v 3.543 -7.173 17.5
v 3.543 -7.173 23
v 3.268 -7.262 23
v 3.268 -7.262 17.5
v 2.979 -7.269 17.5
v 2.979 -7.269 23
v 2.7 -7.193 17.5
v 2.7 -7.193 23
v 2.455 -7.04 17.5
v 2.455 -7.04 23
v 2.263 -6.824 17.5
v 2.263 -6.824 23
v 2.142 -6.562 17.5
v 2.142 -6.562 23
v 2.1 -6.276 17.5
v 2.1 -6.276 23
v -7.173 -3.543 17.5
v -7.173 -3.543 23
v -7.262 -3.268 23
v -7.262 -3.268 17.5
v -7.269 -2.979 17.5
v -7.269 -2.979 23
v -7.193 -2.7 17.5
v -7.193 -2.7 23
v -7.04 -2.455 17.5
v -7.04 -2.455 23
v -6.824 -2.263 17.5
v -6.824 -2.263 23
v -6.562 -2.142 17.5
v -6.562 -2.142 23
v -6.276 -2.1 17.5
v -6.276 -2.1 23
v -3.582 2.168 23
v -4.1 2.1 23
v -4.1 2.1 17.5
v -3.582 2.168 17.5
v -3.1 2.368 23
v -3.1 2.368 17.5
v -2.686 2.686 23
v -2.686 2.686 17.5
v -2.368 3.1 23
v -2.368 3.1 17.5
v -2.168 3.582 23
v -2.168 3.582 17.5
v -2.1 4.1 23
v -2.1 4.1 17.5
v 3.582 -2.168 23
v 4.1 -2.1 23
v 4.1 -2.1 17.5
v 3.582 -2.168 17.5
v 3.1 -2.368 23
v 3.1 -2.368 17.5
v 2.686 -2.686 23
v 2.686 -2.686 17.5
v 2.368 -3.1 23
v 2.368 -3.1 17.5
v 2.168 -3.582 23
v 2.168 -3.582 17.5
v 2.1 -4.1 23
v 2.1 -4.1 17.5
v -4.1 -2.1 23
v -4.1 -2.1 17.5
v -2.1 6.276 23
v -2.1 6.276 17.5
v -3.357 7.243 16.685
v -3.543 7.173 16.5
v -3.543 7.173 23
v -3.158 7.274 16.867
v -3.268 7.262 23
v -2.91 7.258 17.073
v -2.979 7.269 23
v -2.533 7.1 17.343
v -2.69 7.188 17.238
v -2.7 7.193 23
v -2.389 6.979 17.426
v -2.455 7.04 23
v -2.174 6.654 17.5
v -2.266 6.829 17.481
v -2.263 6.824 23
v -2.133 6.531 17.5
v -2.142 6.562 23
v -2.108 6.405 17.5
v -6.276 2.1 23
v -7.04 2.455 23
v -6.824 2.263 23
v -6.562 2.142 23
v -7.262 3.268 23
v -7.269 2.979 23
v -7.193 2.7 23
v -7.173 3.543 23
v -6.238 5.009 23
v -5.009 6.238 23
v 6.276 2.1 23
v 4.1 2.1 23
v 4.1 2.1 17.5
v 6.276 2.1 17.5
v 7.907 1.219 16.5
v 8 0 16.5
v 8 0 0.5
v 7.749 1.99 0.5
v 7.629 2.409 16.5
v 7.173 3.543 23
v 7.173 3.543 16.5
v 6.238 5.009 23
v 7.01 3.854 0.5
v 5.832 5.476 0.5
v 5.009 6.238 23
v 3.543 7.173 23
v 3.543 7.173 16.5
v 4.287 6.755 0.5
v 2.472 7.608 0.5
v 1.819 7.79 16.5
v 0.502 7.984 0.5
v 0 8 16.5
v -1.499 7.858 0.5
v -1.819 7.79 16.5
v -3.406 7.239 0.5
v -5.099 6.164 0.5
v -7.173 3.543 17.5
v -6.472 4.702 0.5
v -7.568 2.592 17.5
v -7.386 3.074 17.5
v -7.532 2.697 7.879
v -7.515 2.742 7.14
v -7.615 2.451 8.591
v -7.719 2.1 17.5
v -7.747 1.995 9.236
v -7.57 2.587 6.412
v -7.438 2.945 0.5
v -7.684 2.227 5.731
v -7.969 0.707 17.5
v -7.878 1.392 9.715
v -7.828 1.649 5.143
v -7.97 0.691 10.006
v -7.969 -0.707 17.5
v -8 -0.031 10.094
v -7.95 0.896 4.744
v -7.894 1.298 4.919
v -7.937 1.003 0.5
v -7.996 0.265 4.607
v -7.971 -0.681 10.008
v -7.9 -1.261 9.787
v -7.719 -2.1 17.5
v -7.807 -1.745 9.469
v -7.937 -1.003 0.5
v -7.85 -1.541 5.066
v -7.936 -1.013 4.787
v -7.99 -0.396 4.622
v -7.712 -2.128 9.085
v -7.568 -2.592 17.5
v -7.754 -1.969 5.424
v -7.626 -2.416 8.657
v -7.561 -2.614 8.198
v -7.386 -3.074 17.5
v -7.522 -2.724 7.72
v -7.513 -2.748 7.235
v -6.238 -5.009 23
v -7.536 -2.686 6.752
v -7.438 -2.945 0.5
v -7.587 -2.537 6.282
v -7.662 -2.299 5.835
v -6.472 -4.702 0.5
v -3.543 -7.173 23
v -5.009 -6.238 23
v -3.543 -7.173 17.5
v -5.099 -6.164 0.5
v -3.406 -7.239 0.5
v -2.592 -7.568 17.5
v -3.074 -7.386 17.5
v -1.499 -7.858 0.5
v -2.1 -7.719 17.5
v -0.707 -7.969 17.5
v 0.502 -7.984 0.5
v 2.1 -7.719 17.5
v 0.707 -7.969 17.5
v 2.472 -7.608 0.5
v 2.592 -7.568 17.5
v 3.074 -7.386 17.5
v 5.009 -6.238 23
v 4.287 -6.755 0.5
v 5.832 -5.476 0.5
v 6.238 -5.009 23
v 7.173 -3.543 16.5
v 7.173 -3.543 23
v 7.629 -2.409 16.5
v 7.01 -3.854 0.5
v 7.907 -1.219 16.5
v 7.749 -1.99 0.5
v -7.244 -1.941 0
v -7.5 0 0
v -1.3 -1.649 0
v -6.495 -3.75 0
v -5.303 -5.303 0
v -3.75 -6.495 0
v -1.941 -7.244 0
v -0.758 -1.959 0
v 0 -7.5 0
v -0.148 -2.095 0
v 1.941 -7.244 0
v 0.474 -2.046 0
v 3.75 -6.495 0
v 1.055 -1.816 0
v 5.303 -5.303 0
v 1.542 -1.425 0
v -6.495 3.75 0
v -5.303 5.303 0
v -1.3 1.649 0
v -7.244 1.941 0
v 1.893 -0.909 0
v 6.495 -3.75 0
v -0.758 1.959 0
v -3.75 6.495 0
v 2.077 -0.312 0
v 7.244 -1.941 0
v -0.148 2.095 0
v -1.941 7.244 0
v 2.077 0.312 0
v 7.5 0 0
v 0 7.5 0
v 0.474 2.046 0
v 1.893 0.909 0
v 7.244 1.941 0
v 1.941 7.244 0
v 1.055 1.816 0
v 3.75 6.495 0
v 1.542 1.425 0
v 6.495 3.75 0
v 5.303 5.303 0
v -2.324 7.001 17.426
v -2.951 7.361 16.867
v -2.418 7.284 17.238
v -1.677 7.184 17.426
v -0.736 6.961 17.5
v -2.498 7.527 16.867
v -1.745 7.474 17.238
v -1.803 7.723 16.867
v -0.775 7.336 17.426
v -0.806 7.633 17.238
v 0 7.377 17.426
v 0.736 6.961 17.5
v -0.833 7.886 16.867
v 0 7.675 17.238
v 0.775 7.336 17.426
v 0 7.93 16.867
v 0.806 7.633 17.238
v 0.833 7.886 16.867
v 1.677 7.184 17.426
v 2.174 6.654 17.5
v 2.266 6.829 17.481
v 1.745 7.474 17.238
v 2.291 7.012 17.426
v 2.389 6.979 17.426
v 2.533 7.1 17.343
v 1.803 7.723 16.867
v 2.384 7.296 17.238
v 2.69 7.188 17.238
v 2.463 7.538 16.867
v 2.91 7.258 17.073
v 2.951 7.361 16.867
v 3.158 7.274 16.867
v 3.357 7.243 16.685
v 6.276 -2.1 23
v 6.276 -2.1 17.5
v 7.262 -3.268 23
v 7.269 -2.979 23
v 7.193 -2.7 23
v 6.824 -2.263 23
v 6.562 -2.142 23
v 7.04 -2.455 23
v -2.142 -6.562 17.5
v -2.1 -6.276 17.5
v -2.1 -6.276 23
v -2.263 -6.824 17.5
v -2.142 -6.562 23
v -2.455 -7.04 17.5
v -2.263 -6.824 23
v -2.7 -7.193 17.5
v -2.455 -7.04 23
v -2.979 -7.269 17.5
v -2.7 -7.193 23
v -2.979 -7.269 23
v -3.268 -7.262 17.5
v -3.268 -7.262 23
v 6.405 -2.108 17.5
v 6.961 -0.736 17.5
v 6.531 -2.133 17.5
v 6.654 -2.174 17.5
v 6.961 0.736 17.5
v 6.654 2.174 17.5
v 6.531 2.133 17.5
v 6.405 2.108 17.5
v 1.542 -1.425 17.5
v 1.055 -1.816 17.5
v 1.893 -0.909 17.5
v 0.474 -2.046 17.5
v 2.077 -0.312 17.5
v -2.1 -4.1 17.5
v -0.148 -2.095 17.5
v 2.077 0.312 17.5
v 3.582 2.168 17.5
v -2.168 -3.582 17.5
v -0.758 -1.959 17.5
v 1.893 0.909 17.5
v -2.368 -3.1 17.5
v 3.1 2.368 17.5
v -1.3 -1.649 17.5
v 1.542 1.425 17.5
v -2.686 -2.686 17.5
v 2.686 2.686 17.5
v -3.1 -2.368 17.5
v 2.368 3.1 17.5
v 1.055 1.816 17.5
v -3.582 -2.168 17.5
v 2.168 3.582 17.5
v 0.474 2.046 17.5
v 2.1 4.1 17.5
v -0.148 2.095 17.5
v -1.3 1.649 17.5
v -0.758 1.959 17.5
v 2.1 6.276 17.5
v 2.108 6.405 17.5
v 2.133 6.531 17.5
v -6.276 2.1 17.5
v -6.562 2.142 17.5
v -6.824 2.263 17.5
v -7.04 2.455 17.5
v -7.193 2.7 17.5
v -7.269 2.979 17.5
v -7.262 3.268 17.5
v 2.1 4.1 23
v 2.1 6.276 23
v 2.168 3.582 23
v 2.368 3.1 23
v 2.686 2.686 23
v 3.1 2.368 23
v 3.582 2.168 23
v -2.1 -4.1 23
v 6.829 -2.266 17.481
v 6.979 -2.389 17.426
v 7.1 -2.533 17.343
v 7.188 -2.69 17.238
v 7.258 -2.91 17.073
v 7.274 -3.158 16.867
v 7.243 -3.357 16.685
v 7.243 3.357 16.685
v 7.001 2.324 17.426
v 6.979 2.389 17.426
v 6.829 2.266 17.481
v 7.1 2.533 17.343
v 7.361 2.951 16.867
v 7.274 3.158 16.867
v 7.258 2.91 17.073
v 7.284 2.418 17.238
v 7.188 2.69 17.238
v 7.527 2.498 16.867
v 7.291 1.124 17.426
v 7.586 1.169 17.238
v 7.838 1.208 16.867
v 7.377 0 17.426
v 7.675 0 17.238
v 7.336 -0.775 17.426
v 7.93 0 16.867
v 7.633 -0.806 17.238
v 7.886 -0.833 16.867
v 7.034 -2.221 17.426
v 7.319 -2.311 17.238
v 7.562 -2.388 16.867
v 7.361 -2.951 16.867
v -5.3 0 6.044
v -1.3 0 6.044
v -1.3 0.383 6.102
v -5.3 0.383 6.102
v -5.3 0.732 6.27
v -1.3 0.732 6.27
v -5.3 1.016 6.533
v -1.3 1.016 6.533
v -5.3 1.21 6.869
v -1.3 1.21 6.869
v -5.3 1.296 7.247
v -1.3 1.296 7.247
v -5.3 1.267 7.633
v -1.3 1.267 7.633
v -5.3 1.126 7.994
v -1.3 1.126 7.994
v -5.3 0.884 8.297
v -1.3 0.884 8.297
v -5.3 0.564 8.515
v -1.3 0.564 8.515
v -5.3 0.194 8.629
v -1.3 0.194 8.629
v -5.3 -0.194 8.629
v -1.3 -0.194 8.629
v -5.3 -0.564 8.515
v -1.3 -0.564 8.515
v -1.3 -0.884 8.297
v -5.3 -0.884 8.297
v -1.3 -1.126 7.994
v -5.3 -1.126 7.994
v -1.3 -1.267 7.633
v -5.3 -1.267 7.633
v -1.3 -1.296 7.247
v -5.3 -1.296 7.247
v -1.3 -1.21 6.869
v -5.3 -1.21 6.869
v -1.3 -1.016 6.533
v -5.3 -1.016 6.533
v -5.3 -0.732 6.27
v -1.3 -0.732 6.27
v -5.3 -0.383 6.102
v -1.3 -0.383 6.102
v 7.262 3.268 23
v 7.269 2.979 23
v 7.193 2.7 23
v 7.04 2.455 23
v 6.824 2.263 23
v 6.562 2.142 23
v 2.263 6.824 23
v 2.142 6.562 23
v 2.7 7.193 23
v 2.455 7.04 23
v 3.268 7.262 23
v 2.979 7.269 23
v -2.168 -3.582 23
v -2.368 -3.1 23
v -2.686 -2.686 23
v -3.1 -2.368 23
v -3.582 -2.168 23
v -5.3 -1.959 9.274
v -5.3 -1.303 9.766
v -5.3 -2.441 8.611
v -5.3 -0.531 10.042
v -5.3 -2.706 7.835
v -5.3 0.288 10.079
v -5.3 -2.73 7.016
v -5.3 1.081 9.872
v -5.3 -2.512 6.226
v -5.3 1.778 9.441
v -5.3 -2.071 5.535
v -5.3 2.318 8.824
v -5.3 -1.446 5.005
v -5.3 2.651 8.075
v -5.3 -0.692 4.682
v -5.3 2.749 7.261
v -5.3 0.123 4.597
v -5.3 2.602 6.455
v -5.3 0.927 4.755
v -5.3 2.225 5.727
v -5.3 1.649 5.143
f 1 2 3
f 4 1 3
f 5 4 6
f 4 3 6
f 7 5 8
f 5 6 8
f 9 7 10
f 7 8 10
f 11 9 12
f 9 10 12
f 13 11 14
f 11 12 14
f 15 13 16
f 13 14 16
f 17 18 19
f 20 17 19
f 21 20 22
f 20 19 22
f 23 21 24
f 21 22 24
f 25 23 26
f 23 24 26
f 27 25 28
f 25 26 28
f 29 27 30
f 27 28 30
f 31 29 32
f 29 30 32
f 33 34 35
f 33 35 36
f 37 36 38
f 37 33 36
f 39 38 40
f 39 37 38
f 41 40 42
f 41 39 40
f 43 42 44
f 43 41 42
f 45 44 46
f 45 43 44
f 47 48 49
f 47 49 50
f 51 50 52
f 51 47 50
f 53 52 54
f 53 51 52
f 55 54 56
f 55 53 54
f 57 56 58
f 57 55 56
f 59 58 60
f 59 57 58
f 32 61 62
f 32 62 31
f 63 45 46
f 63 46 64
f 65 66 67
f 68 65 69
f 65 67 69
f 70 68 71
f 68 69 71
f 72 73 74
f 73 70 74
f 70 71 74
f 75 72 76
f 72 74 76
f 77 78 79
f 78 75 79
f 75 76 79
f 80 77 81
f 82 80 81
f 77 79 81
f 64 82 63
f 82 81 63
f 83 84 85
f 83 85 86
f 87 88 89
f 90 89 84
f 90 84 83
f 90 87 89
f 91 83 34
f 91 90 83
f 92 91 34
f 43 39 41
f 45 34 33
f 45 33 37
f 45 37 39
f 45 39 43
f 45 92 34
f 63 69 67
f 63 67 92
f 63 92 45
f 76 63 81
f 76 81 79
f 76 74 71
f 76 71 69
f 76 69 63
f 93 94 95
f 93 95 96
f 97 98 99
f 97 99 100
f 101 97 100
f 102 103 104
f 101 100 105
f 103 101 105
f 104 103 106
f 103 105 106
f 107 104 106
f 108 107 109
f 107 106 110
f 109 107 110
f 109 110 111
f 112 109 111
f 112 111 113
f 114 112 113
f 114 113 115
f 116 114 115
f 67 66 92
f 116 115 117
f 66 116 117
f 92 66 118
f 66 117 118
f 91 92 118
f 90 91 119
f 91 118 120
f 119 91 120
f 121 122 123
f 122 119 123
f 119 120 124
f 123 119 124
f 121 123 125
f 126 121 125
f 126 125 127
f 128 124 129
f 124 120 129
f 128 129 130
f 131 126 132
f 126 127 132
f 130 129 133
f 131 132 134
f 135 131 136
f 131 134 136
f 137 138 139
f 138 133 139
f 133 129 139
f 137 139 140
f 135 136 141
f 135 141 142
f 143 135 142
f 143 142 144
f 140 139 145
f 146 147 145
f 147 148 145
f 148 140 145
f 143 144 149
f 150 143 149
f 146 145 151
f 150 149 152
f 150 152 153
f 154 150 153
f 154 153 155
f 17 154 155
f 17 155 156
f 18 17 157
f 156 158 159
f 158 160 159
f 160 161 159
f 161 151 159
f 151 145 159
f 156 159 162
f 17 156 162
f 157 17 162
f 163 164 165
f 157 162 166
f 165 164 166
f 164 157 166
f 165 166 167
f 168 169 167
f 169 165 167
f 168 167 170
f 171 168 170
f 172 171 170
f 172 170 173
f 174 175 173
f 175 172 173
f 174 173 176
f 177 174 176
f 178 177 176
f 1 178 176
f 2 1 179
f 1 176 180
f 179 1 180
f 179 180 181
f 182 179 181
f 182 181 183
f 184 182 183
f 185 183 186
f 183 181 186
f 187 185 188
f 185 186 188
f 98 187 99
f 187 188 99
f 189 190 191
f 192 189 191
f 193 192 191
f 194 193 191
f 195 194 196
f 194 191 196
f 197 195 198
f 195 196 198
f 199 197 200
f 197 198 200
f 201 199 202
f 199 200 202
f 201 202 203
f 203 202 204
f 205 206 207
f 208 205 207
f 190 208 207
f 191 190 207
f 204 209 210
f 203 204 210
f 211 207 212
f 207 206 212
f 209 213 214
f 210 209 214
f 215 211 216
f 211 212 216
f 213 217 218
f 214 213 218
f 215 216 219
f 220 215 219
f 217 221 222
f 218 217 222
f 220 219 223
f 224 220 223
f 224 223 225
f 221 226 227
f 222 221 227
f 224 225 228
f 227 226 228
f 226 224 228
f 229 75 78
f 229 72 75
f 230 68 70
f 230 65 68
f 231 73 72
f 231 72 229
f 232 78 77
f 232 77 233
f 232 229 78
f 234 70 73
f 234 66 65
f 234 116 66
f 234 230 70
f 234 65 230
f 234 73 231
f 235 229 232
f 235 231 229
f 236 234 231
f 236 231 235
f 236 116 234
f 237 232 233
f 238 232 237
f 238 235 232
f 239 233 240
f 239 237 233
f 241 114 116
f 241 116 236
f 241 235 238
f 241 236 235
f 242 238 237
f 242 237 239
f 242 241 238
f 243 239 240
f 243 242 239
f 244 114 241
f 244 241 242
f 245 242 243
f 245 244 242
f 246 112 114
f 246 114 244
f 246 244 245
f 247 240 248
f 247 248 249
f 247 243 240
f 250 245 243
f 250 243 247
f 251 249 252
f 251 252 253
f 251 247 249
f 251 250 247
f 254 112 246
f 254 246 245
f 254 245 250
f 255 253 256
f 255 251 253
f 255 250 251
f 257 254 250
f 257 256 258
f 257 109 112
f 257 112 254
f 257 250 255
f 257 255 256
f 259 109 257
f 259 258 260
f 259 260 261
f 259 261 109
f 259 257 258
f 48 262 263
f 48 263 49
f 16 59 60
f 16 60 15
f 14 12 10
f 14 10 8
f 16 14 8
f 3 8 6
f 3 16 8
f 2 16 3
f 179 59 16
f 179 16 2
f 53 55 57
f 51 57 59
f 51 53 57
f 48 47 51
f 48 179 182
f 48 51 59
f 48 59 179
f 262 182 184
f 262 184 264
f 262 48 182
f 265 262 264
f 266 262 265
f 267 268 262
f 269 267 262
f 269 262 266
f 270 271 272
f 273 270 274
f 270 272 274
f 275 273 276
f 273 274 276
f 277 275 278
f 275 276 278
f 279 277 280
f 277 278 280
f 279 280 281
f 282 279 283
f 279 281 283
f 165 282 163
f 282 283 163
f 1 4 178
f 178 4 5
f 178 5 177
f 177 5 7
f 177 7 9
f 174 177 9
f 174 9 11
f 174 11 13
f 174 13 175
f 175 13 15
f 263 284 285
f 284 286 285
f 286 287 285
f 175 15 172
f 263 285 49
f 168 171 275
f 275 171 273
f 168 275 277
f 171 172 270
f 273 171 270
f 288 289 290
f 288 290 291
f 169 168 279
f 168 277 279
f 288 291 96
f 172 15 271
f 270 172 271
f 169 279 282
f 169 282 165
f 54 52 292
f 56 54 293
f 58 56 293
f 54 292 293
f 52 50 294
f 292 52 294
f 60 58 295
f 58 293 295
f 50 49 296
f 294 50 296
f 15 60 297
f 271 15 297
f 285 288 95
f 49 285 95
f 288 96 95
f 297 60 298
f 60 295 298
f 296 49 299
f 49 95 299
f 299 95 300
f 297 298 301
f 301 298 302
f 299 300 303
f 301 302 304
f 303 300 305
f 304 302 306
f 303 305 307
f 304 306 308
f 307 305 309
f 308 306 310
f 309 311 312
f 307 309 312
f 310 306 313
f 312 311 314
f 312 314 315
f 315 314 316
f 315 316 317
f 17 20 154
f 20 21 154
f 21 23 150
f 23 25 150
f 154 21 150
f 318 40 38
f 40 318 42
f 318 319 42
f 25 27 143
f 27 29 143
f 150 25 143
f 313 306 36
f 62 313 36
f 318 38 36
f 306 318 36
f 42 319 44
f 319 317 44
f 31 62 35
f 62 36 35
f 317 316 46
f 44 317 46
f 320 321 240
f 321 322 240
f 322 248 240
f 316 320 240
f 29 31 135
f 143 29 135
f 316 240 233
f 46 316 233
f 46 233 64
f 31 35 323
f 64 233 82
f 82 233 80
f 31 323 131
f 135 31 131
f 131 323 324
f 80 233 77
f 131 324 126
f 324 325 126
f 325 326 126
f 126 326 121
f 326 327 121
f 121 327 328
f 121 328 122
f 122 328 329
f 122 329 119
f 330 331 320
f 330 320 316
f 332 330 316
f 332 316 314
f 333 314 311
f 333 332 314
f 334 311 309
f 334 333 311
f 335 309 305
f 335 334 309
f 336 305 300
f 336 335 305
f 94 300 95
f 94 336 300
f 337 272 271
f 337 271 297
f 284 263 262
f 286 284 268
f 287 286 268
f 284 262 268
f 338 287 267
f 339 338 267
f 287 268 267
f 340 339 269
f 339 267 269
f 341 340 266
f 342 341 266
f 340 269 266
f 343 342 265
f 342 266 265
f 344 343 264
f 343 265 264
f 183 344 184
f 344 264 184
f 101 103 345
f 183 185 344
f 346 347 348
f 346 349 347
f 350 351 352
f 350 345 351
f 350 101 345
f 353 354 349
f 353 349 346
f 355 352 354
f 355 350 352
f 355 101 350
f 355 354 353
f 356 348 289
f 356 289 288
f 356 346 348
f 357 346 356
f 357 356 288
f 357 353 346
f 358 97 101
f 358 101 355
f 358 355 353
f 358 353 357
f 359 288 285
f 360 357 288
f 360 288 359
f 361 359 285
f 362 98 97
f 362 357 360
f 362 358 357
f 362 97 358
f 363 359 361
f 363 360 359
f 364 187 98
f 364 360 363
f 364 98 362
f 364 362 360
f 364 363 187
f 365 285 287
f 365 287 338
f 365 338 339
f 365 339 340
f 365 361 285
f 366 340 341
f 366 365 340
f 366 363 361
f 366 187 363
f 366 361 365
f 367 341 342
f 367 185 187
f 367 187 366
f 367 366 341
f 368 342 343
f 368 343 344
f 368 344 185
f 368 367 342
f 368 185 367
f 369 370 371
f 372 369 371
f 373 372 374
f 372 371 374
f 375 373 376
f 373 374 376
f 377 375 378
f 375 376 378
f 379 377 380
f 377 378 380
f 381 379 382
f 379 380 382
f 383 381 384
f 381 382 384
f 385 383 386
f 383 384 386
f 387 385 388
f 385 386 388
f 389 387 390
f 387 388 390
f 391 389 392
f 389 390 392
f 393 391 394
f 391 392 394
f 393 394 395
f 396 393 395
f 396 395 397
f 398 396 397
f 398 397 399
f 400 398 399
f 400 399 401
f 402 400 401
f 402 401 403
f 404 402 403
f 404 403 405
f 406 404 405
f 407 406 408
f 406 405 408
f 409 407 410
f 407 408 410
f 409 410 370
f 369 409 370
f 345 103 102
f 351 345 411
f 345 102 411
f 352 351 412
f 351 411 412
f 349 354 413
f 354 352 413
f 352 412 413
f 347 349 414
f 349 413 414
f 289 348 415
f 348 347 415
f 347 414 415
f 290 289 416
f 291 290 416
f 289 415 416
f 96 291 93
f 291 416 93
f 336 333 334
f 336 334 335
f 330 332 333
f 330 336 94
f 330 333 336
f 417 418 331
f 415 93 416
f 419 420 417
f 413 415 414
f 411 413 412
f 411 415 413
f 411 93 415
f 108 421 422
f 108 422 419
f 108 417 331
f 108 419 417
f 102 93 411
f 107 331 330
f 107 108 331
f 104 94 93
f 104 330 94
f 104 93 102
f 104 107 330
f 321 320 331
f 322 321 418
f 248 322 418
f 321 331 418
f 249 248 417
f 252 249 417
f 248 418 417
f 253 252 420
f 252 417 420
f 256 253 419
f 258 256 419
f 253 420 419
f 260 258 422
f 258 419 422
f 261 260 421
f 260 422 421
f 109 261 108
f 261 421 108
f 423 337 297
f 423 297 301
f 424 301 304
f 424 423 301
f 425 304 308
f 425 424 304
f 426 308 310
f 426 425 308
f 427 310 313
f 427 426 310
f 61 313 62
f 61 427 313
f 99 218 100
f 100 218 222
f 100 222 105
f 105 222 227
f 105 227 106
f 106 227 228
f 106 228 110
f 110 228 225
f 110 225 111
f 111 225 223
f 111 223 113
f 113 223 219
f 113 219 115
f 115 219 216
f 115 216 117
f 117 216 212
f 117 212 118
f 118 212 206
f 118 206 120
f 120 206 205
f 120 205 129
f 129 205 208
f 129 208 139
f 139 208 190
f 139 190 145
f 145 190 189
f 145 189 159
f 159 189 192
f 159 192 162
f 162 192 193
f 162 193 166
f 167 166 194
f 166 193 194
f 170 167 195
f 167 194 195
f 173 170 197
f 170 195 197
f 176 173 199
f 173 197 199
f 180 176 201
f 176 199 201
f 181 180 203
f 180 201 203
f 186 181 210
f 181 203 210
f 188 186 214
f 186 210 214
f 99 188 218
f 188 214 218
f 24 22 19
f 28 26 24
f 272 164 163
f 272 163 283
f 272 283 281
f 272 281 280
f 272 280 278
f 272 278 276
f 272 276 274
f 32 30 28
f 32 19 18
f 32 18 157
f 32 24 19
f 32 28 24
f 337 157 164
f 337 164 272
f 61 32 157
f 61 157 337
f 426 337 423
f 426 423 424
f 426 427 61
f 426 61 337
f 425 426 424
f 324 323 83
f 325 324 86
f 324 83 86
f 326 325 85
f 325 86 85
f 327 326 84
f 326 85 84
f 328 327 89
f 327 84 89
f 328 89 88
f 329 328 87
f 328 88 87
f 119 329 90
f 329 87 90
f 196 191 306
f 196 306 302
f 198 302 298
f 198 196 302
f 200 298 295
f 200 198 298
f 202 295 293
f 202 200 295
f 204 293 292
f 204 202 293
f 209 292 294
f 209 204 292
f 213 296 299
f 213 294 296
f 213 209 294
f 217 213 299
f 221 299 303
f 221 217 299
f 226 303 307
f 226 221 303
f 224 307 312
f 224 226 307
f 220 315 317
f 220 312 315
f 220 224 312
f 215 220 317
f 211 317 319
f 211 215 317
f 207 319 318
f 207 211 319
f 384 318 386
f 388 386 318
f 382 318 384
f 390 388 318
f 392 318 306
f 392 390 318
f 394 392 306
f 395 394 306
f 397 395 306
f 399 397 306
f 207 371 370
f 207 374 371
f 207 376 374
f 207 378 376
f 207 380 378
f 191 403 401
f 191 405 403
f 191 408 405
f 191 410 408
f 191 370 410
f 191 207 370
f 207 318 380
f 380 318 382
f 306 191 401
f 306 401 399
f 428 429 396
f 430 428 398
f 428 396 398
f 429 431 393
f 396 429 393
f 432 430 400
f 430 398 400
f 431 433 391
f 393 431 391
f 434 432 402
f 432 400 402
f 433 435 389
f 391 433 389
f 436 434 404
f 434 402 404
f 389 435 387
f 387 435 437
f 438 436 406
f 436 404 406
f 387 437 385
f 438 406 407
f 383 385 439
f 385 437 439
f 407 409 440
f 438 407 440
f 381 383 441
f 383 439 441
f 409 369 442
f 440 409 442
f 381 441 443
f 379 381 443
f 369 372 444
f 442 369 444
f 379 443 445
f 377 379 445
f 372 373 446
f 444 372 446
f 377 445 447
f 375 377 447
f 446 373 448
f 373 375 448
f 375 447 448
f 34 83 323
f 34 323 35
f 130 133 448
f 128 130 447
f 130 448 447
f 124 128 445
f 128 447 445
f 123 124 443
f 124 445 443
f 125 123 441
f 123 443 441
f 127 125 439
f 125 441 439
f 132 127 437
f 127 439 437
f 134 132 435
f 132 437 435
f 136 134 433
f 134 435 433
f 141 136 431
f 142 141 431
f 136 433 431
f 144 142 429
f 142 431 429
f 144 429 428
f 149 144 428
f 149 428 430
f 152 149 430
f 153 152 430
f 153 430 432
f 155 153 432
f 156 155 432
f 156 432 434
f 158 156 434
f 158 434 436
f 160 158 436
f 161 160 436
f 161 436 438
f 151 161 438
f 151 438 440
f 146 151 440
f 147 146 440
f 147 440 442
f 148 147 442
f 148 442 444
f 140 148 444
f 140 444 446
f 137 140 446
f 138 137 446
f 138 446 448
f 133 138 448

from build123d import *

# Parameters (mm, degrees)
SKETCH1_R           = 8
BOSS_EXTRUDE1_DEPTH = 23
CUT_EXTRUDE1_DEPTH  = 5.5
CHAMFER1_SIZE       = 0.5
FILLET1_R           = 1
SKETCH3_R           = 2.75
CUT_EXTRUDE2_DEPTH  = 15.5
SKETCH5_R           = 3.239790556
SKETCH5_R_2         = 1.3
BOSS_EXTRUDE2_DEPTH = 4


with BuildPart() as part:
    # Sketch1 → Boss-Extrude1 (new body)
    with BuildSketch(Plane.XY):
        Circle(SKETCH1_R)
        with BuildLine():
            Line((-1.3, 1.64924225), (-1.3, -1.64924225))
            ThreePointArc((-1.3, -1.64924225), (2.1, 0), (-1.3, 1.64924225))
        make_face(mode=Mode.SUBTRACT)
    extrude(amount=BOSS_EXTRUDE1_DEPTH)

    # Sketch2 → Cut-Extrude1 (cut)
    with BuildSketch(Plane.XY.offset(23)):
        with BuildLine():
            Line((4.1, 2.1), (9.874781321, 2.1))
            Line((9.874781321, 2.1), (9.874781321, -2.1))
            Line((9.874781321, -2.1), (4.1, -2.1))
            ThreePointArc((4.1, -2.1), (2.685786438, -2.685786438), (2.1, -4.1))
            Line((2.1, -4.1), (2.1, -8.269913673))
            Line((2.1, -8.269913673), (-2.1, -8.269913673))
            Line((-2.1, -8.269913673), (-2.1, -4.1))
            ThreePointArc((-2.1, -4.1), (-2.685786438, -2.685786438), (-4.1, -2.1))
            Line((-4.1, -2.1), (-9.874781321, -2.1))
            Line((-9.874781321, -2.1), (-9.874781321, 2.1))
            Line((-9.874781321, 2.1), (-4.1, 2.1))
            ThreePointArc((-4.1, 2.1), (-2.685786438, 2.685786438), (-2.1, 4.1))
            Line((-2.1, 4.1), (-2.1, 8.269913673))
            Line((-2.1, 8.269913673), (2.1, 8.269913673))
            Line((2.1, 8.269913673), (2.1, 4.1))
            ThreePointArc((2.1, 4.1), (2.685786438, 2.685786438), (4.1, 2.1))
        make_face()
    extrude(amount=-CUT_EXTRUDE1_DEPTH, mode=Mode.SUBTRACT)

    # Chamfer1
    chamfer1_edges = [part.edges().sort_by_distance(p)[0] for p in [
        (-8, 0, 0),
    ]]
    chamfer(chamfer1_edges, length=CHAMFER1_SIZE)

    # Fillet1
    # the kernel refuses this fillet: 1 mm, written as the material it takes off along each edge
    with BuildSketch(Plane(origin=(-7.719455939, 2.1, 26.857409903), x_dir=(0.35433001139154063, 0.9351204430592194, 0), z_dir=(0, 0, -1)), Plane(origin=(-2.1, -7.719455939, 26.857409903), x_dir=(-0.9351204430592192, 0.354330011391541, 0), z_dir=(0, 0, -1)), Plane(origin=(7.719455939, -2.1, 26.857409903), x_dir=(-0.354330011391541, -0.9351204430592192, 0), z_dir=(0, 0, -1)), Plane(origin=(2.1, 7.719455939, 26.857409903), x_dir=(0.935120443059219, -0.3543300113915411, 0), z_dir=(0, 0, -1))) as fillet1_piece_1:
        with BuildLine():
            CenterArc((1.446528713, 0.99533926), FILLET1_R, 159.247612079, 116.286320683)
            Line((0.51140827, 1.349669272), (0, 0))
            ThreePointArc((0, 0), (0.771481981, -0.037285918), (1.542963961, 0))
        make_face()
    extrude(amount=9.357409903, mode=Mode.SUBTRACT)
    with BuildSketch(Plane(origin=(-7.719455939, -2.1, 26.857409903), x_dir=(0.35433001139154124, -0.9351204430592192, 0), z_dir=(0, 0, -1)), Plane(origin=(2.1, -7.719455939, 26.857409903), x_dir=(0.935120443059219, 0.3543300113915412, 0), z_dir=(0, 0, -1)), Plane(origin=(7.719455939, 2.1, 26.857409903), x_dir=(-0.3543300113915409, 0.9351204430592193, 0), z_dir=(0, 0, -1)), Plane(origin=(-2.1, 7.719455939, 26.857409903), x_dir=(-0.935120443059219, -0.3543300113915412, 0), z_dir=(0, 0, -1))) as fillet1_piece_2:
        with BuildLine():
            CenterArc((1.446528713, -0.99533926), FILLET1_R, 84.466067237, 116.286320683)
            Line((0.51140827, -1.349669272), (0, 0))
            ThreePointArc((0, 0), (0.771481981, 0.037285918), (1.542963961, 0))
        make_face()
    extrude(amount=9.357409903, mode=Mode.SUBTRACT)
    with BuildSketch(Plane(origin=(0, 0, 17.5), x_dir=(1, 0, 0), z_dir=(0, 1, 0))) as fillet1_piece_3_section:
        with BuildLine():
            CenterArc((8 - FILLET1_R, FILLET1_R), FILLET1_R, 270, 90)
            Line((8 - FILLET1_R, 0), (8, 0))
            Line((8, 0), (8, FILLET1_R))
        make_face()
    fillet1_piece_3 = revolve(axis=Axis((0, 0, 17.5), (0, 0, -1)), revolution_arc=33.123591855, mode=Mode.PRIVATE)
    fillet1_piece_3 = split(fillet1_piece_3, bisect_by=Plane(origin=(7.676771465, -2.1, 17.273698774), z_dir=(0, 1, 0)), keep=Keep.TOP, mode=Mode.PRIVATE)
    add(fillet1_piece_3, mode=Mode.SUBTRACT)
    with BuildSketch(Plane(origin=(0, 0, 17.5), x_dir=(-0.5464558660226709, 0.8374879022943631, 0), z_dir=(-0.8374879022943631, -0.5464558660226709, 0))) as fillet1_piece_4_section:
        with BuildLine():
            CenterArc((8 - FILLET1_R, FILLET1_R), FILLET1_R, 270, 90)
            Line((8 - FILLET1_R, 0), (8, 0))
            Line((8, 0), (8, FILLET1_R))
        make_face()
    fillet1_piece_4 = revolve(axis=Axis((0, 0, 17.5), (0, 0, -1)), revolution_arc=66.248417342, mode=Mode.PRIVATE)
    fillet1_piece_4 = split(fillet1_piece_4, bisect_by=Plane(origin=(2.1, 7.676771683, 17.273698772), z_dir=(-1, 0, 0)), keep=Keep.TOP, mode=Mode.PRIVATE)
    fillet1_piece_4 = split(fillet1_piece_4, bisect_by=Plane(origin=(-2.1, 7.676771683, 17.273698772), z_dir=(1, 0, 0)), keep=Keep.TOP, mode=Mode.PRIVATE)
    add(fillet1_piece_4, mode=Mode.SUBTRACT)
    with BuildSketch(Plane(origin=(0, 0, 17.5), x_dir=(0.8374937851055057, 0.5464468500317786, 0), z_dir=(-0.5464468500317786, 0.8374937851055057, 0))) as fillet1_piece_5_section:
        with BuildLine():
            CenterArc((8 - FILLET1_R, FILLET1_R), FILLET1_R, 270, 90)
            Line((8 - FILLET1_R, 0), (8, 0))
            Line((8, 0), (8, FILLET1_R))
        make_face()
    fillet1_piece_5 = revolve(axis=Axis((0, 0, 17.5), (0, 0, -1)), revolution_arc=33.123591855, mode=Mode.PRIVATE)
    fillet1_piece_5 = split(fillet1_piece_5, bisect_by=Plane(origin=(7.676771942, 2.1, 17.273698679), z_dir=(0, -1, 0)), keep=Keep.TOP, mode=Mode.PRIVATE)
    add(fillet1_piece_5, mode=Mode.SUBTRACT)
    with BuildSketch(Plane(origin=(0, 0, 17.5), x_dir=(1, 0, 0), z_dir=(0, 1, 0))) as fillet1_piece_6a_section:
        with BuildLine():
            CenterArc((8 - FILLET1_R, FILLET1_R), FILLET1_R, 270, 90)
            Line((8 - FILLET1_R, 0), (8, 0))
            Line((8, 0), (8, FILLET1_R))
        make_face()
    fillet1_piece_6a = revolve(axis=Axis((0, 0, 17.5), (0, 0, -1)), revolution_arc=33.123591855, mode=Mode.PRIVATE)
    fillet1_piece_6a = split(fillet1_piece_6a, bisect_by=Plane(origin=(7.062995789, -2.1, 17.266816247), z_dir=(0, -1, 0)), keep=Keep.TOP, mode=Mode.PRIVATE)
    with BuildSketch(Plane(origin=(7.719455939, -2.1, 26.857409903), x_dir=(-0.354330011391541, -0.9351204430592192, 0), z_dir=(0, 0, -1))) as fillet1_piece_6b_section:
        with BuildLine():
            CenterArc((1.446528713, 0.99533926), FILLET1_R, 159.247612079, 116.286320683)
            Line((0.51140827, 1.349669272), (0, 0))
            ThreePointArc((0, 0), (0.771481981, -0.037285918), (1.542963961, 0))
        make_face()
    fillet1_piece_6b = extrude(amount=13.214819805, mode=Mode.PRIVATE)
    fillet1_piece_6b = split(fillet1_piece_6b, bisect_by=Plane(origin=(7.268798231, -2.449324776, 17.5), z_dir=(0, 0, -1)), keep=Keep.TOP, mode=Mode.PRIVATE)
    fillet1_piece_6 = fillet1_piece_6a & fillet1_piece_6b
    add(fillet1_piece_6, mode=Mode.SUBTRACT)
    with BuildSketch(Plane(origin=(0, 0, 17.5), x_dir=(0.8374937851055057, 0.5464468500317786, 0), z_dir=(-0.5464468500317786, 0.8374937851055057, 0))) as fillet1_piece_7a_section:
        with BuildLine():
            CenterArc((8 - FILLET1_R, FILLET1_R), FILLET1_R, 270, 90)
            Line((8 - FILLET1_R, 0), (8, 0))
            Line((8, 0), (8, FILLET1_R))
        make_face()
    fillet1_piece_7a = revolve(axis=Axis((0, 0, 17.5), (0, 0, -1)), revolution_arc=33.123591855, mode=Mode.PRIVATE)
    fillet1_piece_7a = split(fillet1_piece_7a, bisect_by=Plane(origin=(7.062995574, 2.1, 17.266816271), z_dir=(0, 1, 0)), keep=Keep.TOP, mode=Mode.PRIVATE)
    with BuildSketch(Plane(origin=(7.719455939, 2.1, 26.857409903), x_dir=(-0.3543300113915409, 0.9351204430592193, 0), z_dir=(0, 0, -1))) as fillet1_piece_7b_section:
        with BuildLine():
            CenterArc((1.446528713, -0.99533926), FILLET1_R, 84.466067237, 116.286320683)
            Line((0.51140827, -1.349669272), (0, 0))
            ThreePointArc((0, 0), (0.771481981, 0.037285918), (1.542963961, 0))
        make_face()
    fillet1_piece_7b = extrude(amount=13.214819805, mode=Mode.PRIVATE)
    fillet1_piece_7b = split(fillet1_piece_7b, bisect_by=Plane(origin=(7.268798231, 2.449324776, 17.5), z_dir=(0, 0, -1)), keep=Keep.TOP, mode=Mode.PRIVATE)
    fillet1_piece_7 = fillet1_piece_7a & fillet1_piece_7b
    add(fillet1_piece_7, mode=Mode.SUBTRACT)
    with BuildSketch(Plane(origin=(2.1, 7.719455939, 26.857409903), x_dir=(0.935120443059219, -0.3543300113915411, 0), z_dir=(0, 0, -1))) as fillet1_piece_8a_section:
        with BuildLine():
            CenterArc((1.446528713, 0.99533926), FILLET1_R, 159.247612079, 116.286320683)
            Line((0.51140827, 1.349669272), (0, 0))
            ThreePointArc((0, 0), (0.771481981, -0.037285918), (1.542963961, 0))
        make_face()
    fillet1_piece_8a = extrude(amount=13.214819805, mode=Mode.PRIVATE)
    fillet1_piece_8a = split(fillet1_piece_8a, bisect_by=Plane(origin=(2.449324776, 7.268798231, 17.5), z_dir=(0, 0, -1)), keep=Keep.TOP, mode=Mode.PRIVATE)
    with BuildSketch(Plane(origin=(0, 0, 17.5), x_dir=(-0.5464558660226709, 0.8374879022943631, 0), z_dir=(-0.8374879022943631, -0.5464558660226709, 0))) as fillet1_piece_8b_section:
        with BuildLine():
            CenterArc((8 - FILLET1_R, FILLET1_R), FILLET1_R, 270, 90)
            Line((8 - FILLET1_R, 0), (8, 0))
            Line((8, 0), (8, FILLET1_R))
        make_face()
    fillet1_piece_8b = revolve(axis=Axis((0, 0, 17.5), (0, 0, -1)), revolution_arc=66.248417342, mode=Mode.PRIVATE)
    fillet1_piece_8b = split(fillet1_piece_8b, bisect_by=Plane(origin=(2.1, 7.062976431, 17.266816363), z_dir=(1, 0, 0)), keep=Keep.TOP, mode=Mode.PRIVATE)
    fillet1_piece_8 = fillet1_piece_8a & fillet1_piece_8b
    add(fillet1_piece_8, mode=Mode.SUBTRACT)
    with BuildSketch(Plane(origin=(0, 0, 17.5), x_dir=(-0.5464558660226709, 0.8374879022943631, 0), z_dir=(-0.8374879022943631, -0.5464558660226709, 0))) as fillet1_piece_9a_section:
        with BuildLine():
            CenterArc((8 - FILLET1_R, FILLET1_R), FILLET1_R, 270, 90)
            Line((8 - FILLET1_R, 0), (8, 0))
            Line((8, 0), (8, FILLET1_R))
        make_face()
    fillet1_piece_9a = revolve(axis=Axis((0, 0, 17.5), (0, 0, -1)), revolution_arc=66.248417342, mode=Mode.PRIVATE)
    fillet1_piece_9a = split(fillet1_piece_9a, bisect_by=Plane(origin=(-2.1, 7.062976216, 17.266816386), z_dir=(-1, 0, 0)), keep=Keep.TOP, mode=Mode.PRIVATE)
    with BuildSketch(Plane(origin=(-2.1, 7.719455939, 26.857409903), x_dir=(-0.935120443059219, -0.3543300113915412, 0), z_dir=(0, 0, -1))) as fillet1_piece_9b_section:
        with BuildLine():
            CenterArc((1.446528713, -0.99533926), FILLET1_R, 84.466067237, 116.286320683)
            Line((0.51140827, -1.349669272), (0, 0))
            ThreePointArc((0, 0), (0.771481981, 0.037285918), (1.542963961, 0))
        make_face()
    fillet1_piece_9b = extrude(amount=13.214819805, mode=Mode.PRIVATE)
    fillet1_piece_9b = split(fillet1_piece_9b, bisect_by=Plane(origin=(-2.449324776, 7.268798231, 17.5), z_dir=(0, 0, -1)), keep=Keep.TOP, mode=Mode.PRIVATE)
    fillet1_piece_9 = fillet1_piece_9a & fillet1_piece_9b
    add(fillet1_piece_9, mode=Mode.SUBTRACT)

    # Sketch3 → Cut-Extrude2 (cut)
    with BuildSketch(Plane(origin=(-1.3, 0, 0), x_dir=(0, 0, -1), z_dir=(1, 0, 0))):
        with Locations(Location((-7.343789521, 0, 0), (0, 0, 36.850165711))):
            Circle(SKETCH3_R)
    extrude(amount=-CUT_EXTRUDE2_DEPTH, mode=Mode.SUBTRACT)

    # Sketch5 → Boss-Extrude2 (add)
    with BuildSketch(Plane(origin=(-1.3, 0, 0), x_dir=(0, 0, -1), z_dir=(1, 0, 0))):
        with Locations((-7.343789521, 0)):
            Circle(SKETCH5_R)
        with Locations((-7.343789521, 0)):
            Circle(SKETCH5_R_2, mode=Mode.SUBTRACT)
    extrude(amount=-BOSS_EXTRUDE2_DEPTH)


solid = part.part
